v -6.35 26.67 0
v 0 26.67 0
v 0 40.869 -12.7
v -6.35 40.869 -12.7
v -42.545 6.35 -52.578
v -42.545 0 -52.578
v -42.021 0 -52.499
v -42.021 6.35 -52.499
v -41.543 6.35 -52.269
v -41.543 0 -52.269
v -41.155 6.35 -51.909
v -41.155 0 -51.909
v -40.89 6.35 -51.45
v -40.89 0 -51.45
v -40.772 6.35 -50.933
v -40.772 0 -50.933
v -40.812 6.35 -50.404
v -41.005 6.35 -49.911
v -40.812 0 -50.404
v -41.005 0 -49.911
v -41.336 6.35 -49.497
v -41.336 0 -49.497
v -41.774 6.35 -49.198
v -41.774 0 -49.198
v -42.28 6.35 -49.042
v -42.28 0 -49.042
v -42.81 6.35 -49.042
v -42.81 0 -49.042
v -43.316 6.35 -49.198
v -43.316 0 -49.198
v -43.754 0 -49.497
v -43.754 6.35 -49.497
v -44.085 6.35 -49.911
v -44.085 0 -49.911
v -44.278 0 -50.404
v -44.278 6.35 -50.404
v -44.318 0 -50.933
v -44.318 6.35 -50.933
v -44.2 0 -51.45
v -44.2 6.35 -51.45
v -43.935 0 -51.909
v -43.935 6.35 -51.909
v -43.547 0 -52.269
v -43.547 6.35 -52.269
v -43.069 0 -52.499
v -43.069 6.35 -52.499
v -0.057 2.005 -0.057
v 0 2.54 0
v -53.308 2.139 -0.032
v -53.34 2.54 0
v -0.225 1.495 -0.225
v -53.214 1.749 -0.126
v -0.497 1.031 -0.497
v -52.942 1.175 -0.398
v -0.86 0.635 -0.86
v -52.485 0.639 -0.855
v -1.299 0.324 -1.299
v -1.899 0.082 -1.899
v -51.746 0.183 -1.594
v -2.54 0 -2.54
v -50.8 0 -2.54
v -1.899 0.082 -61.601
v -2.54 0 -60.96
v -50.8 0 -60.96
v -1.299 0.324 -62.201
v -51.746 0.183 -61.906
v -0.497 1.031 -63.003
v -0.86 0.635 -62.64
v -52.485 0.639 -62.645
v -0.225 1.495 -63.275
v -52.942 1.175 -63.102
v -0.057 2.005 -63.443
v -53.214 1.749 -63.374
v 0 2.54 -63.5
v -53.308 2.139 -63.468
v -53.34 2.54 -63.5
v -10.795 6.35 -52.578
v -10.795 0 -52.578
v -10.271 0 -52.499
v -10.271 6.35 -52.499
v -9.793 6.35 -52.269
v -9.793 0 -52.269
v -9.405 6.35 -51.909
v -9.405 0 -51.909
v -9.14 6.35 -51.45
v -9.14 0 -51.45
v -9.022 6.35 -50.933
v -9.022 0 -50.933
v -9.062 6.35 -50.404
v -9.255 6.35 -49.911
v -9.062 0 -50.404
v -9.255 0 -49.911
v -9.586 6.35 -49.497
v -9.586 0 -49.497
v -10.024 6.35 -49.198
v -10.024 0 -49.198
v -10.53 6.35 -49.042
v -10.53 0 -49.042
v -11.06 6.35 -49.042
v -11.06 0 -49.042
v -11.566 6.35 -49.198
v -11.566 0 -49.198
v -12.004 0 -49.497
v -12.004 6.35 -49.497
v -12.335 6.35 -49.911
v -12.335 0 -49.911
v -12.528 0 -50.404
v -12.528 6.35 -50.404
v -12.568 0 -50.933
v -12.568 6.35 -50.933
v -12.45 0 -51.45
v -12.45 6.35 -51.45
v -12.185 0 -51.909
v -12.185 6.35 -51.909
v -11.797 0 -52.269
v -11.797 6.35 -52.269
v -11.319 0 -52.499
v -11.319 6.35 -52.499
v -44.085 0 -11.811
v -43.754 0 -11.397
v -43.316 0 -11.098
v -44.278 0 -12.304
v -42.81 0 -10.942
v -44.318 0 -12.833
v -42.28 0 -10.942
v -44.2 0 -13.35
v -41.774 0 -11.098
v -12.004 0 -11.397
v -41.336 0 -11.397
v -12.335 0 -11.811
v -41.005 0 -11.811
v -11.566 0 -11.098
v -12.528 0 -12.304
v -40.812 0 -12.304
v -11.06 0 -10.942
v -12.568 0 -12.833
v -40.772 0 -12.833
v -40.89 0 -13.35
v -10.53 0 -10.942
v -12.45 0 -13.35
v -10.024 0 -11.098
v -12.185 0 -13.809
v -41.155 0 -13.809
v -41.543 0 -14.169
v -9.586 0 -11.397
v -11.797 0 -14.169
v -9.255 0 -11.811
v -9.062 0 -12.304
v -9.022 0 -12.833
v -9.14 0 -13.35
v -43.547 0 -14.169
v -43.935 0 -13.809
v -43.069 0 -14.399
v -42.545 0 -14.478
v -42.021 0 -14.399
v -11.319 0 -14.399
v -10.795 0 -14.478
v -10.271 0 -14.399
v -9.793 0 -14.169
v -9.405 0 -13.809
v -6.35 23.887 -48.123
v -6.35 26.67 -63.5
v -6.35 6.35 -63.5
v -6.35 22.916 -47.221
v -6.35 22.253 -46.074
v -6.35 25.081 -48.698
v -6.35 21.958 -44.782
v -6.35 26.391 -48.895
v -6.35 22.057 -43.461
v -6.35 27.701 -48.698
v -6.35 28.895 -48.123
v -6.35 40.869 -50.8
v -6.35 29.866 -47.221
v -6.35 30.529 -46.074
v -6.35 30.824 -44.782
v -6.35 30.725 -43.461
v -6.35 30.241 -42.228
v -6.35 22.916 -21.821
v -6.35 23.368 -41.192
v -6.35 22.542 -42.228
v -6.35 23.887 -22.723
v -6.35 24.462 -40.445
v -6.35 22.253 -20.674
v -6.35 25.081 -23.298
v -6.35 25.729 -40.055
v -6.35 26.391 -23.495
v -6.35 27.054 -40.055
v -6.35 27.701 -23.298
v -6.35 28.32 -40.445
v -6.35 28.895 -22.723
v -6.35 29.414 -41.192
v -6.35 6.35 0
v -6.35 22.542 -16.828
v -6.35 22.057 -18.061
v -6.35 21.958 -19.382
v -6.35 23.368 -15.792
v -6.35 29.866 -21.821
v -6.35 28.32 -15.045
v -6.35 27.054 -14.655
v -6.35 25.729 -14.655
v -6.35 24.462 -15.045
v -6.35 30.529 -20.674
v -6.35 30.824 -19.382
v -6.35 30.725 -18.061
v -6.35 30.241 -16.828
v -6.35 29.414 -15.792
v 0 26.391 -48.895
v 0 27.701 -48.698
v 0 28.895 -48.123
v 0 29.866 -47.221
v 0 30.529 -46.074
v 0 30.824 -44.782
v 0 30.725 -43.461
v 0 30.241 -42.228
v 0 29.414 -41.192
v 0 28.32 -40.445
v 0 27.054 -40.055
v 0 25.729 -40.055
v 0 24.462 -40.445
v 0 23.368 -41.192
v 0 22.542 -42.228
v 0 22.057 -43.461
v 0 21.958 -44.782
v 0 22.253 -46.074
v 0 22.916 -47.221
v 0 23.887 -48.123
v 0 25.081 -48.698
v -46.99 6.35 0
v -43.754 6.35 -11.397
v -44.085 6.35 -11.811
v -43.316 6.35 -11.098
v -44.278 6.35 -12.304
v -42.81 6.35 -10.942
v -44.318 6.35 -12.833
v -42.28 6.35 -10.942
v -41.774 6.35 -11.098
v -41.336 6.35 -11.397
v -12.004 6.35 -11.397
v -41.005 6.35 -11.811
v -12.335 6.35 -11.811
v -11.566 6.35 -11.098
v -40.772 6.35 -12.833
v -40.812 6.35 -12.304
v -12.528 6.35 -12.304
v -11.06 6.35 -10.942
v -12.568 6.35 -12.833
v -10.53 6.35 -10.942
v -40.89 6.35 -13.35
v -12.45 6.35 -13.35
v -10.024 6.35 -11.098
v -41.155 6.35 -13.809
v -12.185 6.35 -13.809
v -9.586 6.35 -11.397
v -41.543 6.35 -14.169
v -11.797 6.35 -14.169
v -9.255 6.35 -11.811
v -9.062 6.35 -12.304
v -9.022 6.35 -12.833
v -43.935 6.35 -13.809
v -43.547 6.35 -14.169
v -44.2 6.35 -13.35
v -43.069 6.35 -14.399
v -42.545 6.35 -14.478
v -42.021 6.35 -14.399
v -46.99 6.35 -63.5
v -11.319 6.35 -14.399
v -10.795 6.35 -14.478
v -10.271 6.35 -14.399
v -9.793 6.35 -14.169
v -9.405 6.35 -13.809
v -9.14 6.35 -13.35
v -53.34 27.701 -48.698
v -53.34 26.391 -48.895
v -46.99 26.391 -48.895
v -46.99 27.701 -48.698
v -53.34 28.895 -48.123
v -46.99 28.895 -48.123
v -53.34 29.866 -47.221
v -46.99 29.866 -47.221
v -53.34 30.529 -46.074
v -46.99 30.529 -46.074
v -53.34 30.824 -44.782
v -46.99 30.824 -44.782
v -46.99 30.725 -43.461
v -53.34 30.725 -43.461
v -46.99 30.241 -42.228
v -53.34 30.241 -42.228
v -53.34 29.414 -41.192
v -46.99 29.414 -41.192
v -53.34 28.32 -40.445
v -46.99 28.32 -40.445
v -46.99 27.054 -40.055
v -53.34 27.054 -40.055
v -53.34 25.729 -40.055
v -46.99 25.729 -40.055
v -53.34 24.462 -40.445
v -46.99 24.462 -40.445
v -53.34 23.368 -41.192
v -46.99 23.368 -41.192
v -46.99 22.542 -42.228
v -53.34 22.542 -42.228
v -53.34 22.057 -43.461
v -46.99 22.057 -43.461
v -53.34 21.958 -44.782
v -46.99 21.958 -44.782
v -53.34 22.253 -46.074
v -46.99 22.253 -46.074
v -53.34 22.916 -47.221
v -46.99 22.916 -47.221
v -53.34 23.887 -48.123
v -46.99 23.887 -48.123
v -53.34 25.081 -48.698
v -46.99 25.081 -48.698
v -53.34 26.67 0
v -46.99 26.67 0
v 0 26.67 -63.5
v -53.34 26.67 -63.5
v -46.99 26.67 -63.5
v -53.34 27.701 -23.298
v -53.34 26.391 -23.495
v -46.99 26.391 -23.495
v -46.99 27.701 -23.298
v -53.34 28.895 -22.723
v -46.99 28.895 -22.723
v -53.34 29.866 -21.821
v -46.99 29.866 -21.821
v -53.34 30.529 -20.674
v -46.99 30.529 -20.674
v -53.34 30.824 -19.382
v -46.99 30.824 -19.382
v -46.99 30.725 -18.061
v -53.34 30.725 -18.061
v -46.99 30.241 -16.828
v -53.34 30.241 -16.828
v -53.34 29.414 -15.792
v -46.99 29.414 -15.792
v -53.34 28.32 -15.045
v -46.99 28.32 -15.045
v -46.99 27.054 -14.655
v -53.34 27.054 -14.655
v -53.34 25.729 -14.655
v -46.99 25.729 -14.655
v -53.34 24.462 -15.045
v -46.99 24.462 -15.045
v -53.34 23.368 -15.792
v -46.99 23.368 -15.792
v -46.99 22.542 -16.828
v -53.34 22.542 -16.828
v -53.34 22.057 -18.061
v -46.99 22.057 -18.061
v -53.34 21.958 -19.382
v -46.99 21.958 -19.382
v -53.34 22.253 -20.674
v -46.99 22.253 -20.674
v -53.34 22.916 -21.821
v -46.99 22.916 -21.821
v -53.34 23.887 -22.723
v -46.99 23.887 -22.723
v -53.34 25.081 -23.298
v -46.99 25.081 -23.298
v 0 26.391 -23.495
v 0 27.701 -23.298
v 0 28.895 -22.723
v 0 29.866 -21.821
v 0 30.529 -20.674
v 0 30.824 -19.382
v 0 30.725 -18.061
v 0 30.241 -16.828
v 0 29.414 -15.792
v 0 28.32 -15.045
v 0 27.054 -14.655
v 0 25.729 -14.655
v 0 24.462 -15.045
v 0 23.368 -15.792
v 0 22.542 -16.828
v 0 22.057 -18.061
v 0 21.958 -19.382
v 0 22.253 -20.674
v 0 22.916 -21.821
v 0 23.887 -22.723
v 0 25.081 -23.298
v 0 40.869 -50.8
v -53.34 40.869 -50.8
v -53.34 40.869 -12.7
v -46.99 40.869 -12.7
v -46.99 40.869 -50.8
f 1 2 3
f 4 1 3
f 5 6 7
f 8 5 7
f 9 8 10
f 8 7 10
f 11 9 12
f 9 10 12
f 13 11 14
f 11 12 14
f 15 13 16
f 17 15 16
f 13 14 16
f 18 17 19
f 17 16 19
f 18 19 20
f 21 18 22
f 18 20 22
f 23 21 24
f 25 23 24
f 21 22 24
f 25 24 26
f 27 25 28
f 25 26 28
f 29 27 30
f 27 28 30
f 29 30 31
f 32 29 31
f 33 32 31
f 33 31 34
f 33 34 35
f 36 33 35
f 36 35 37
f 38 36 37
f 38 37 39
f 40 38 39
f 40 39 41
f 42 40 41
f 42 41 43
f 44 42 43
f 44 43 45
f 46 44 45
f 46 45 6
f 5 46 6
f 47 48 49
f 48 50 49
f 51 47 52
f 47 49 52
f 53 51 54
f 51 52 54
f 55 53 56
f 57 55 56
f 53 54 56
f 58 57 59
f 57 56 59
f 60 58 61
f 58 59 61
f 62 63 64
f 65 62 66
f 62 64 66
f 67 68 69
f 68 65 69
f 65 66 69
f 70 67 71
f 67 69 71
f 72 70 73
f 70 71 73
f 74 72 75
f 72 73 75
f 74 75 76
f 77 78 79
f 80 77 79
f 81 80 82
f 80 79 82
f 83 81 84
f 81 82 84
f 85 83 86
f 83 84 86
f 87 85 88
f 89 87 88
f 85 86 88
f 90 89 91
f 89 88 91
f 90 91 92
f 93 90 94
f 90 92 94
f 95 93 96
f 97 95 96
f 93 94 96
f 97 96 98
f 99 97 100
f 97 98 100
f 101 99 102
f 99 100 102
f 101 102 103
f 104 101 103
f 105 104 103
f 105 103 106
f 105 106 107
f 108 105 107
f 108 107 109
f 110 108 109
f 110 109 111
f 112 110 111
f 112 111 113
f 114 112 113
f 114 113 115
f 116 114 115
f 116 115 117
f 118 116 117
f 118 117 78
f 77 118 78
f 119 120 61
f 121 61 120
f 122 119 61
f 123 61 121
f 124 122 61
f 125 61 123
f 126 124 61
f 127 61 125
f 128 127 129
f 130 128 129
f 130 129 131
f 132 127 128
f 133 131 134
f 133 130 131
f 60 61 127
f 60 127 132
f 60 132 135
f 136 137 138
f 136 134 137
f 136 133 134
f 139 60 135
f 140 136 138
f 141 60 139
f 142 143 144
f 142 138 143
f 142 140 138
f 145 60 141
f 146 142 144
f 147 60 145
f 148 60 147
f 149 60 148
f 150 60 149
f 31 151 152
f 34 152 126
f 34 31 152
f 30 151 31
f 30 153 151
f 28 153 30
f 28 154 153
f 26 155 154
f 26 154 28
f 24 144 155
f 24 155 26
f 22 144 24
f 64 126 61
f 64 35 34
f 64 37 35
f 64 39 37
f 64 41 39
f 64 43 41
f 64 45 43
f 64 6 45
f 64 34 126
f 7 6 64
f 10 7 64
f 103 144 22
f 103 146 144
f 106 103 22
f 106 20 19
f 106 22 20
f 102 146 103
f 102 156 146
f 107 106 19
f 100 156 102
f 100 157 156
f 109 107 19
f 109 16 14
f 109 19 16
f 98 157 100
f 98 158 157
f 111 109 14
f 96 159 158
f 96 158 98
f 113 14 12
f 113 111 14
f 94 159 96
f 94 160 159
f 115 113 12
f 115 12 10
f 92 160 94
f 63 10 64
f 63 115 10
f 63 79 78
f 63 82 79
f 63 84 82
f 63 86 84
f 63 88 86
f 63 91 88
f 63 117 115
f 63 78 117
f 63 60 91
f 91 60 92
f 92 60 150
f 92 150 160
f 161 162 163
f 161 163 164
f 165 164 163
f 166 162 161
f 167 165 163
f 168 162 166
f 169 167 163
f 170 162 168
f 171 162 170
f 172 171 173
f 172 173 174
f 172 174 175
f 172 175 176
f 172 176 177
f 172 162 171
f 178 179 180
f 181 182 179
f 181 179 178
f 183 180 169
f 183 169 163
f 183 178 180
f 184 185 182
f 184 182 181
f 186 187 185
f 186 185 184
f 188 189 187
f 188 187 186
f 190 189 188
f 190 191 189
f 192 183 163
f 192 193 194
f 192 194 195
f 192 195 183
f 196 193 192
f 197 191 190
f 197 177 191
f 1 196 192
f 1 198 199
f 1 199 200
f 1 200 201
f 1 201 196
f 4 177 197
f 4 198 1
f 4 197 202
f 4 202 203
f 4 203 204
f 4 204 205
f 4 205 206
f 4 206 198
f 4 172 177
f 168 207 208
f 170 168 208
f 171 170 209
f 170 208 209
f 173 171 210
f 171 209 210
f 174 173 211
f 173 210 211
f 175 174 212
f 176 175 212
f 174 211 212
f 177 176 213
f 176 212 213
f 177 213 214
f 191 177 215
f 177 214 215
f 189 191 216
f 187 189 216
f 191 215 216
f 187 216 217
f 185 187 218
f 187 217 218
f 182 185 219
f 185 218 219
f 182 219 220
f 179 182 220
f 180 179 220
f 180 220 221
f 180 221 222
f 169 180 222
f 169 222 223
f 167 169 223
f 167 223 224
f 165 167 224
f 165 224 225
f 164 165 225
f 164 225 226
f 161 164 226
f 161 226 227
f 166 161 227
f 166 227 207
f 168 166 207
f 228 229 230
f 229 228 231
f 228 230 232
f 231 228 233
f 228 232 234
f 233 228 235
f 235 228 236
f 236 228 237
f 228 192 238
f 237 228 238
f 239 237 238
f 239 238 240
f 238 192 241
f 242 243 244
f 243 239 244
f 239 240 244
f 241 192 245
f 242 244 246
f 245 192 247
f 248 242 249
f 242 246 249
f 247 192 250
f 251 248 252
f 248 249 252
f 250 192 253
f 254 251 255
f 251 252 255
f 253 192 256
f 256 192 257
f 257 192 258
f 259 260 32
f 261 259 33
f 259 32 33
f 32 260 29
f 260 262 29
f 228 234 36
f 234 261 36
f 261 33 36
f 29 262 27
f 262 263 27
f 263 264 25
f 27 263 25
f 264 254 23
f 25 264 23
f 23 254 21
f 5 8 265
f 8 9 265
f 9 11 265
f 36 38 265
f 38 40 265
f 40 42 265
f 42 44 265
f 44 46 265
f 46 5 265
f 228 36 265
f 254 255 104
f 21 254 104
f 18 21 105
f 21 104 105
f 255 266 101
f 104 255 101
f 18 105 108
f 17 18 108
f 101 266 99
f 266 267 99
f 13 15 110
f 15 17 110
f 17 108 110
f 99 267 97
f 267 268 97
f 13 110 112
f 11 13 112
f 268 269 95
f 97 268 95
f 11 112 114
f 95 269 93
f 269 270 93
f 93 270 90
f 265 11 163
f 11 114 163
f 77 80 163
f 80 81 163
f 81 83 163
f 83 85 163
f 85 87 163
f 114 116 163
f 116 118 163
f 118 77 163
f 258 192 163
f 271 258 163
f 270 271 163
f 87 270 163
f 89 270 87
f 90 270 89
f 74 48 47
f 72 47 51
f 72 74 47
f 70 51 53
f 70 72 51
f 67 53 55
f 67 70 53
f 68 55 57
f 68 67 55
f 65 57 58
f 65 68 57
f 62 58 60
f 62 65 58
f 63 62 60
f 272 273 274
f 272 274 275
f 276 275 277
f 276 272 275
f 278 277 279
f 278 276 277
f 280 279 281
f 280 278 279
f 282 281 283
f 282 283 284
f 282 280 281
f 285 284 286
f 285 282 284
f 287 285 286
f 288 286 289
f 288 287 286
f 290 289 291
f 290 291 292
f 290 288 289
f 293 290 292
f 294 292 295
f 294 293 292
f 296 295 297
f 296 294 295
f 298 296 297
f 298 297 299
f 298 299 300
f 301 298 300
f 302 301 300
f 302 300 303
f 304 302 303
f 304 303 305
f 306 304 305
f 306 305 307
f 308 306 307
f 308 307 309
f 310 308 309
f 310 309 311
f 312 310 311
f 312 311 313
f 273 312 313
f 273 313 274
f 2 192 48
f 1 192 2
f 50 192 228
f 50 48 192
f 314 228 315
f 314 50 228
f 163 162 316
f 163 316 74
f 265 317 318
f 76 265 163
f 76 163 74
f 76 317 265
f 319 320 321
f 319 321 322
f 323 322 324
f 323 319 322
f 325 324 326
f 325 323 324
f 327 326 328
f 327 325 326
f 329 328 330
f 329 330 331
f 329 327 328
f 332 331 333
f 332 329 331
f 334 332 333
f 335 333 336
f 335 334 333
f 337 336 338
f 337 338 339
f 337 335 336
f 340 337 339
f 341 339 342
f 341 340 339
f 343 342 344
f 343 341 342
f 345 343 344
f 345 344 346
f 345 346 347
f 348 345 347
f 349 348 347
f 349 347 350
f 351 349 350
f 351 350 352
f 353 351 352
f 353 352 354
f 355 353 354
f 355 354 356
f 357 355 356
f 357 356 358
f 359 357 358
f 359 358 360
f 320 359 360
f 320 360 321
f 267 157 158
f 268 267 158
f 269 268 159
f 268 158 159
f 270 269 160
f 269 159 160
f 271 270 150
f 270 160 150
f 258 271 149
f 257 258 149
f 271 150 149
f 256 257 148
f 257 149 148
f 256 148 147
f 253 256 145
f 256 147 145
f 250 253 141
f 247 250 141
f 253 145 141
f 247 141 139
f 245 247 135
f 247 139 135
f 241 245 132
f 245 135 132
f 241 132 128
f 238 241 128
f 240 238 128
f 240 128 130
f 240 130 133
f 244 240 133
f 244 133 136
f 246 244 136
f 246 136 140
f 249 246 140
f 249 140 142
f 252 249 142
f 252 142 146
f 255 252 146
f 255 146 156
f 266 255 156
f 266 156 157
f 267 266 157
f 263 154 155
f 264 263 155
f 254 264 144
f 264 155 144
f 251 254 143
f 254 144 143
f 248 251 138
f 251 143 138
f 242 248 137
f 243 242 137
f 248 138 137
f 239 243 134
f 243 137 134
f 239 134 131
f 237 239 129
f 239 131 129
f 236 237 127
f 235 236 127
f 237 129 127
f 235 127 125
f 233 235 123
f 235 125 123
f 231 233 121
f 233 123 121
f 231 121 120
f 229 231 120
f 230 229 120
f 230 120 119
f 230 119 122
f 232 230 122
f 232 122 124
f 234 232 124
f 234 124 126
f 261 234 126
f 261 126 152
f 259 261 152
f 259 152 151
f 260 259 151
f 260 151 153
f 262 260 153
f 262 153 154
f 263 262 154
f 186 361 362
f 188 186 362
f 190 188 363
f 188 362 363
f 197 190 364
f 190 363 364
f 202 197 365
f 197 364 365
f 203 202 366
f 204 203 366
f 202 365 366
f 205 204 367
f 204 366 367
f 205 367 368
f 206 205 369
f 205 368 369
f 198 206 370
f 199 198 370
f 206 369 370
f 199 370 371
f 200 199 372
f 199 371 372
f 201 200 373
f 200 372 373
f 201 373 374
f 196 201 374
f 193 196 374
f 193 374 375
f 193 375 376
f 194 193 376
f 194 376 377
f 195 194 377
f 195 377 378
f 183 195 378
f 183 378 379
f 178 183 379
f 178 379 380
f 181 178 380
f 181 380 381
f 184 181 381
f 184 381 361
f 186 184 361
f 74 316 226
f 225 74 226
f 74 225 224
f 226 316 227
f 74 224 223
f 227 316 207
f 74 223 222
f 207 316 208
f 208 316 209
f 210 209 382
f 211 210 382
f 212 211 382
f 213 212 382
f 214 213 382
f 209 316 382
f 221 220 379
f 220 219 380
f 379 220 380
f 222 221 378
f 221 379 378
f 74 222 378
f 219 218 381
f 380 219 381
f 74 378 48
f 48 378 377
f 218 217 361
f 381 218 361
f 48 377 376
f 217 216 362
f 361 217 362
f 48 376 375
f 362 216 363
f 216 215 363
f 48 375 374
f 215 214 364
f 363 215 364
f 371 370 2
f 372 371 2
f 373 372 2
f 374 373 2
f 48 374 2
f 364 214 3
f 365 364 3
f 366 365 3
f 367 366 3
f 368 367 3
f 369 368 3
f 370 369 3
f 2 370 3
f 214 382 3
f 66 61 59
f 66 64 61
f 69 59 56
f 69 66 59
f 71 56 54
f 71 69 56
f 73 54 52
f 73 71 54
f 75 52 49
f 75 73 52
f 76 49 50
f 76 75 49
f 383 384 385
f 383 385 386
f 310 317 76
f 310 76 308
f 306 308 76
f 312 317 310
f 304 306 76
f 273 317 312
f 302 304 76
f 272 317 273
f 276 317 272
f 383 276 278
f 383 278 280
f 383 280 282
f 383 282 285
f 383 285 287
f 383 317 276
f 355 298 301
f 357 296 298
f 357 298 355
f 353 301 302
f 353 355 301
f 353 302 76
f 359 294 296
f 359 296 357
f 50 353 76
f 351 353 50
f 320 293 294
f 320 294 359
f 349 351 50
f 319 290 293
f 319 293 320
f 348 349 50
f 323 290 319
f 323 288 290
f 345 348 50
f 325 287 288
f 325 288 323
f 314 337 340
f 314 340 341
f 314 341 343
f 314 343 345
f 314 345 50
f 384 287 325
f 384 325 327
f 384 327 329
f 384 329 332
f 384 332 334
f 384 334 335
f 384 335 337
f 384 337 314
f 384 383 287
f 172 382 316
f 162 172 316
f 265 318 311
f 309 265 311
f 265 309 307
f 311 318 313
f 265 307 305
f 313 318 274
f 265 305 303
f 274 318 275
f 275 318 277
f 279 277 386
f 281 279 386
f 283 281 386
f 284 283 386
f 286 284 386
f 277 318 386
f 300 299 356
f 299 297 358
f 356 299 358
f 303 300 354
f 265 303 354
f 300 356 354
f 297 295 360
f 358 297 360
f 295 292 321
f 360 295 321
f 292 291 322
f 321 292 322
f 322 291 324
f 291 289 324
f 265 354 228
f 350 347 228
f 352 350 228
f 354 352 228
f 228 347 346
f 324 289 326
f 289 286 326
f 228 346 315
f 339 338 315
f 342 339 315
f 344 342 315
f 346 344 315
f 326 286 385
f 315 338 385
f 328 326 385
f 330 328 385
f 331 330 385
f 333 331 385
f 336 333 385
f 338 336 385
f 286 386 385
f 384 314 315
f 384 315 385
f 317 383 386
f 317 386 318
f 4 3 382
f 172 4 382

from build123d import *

# Parameters (mm, degrees)
SKETCH1_W           = 63.5
SKETCH1_H           = 6.35
BOSS_EXTRUDE1_DEPTH = 53.34
BOSS_EXTRUDE2_DEPTH = 6.35
CUT_EXTRUDE1_REACH  = 94.454
SKETCH11_R          = 4.445
FILLET1_R           = 2.54
CUT_EXTRUDE2_REACH  = 94.454
SKETCH19_R          = 1.778


with BuildPart() as part:
    # Sketch1 → Boss-Extrude1 (new body)
    with BuildSketch(Plane(origin=(0, 0, 0), x_dir=(0, 0, -1), z_dir=(1, 0, 0))):
        with Locations((31.75, 3.175)):
            Rectangle(SKETCH1_W, SKETCH1_H)
    extrude(amount=-BOSS_EXTRUDE1_DEPTH)

    # Sketch2 → Boss-Extrude2 (add)
    with BuildSketch(Plane(origin=(0, 0, 0), x_dir=(0, 0, -1), z_dir=(1, 0, 0))):
        Polygon((0, 6.35), (0, 26.67), (12.7, 40.869031657), (50.8, 40.869031657), (63.5, 26.67), (63.5, 6.35), align=None)
    boss_extrude2 = extrude(amount=-BOSS_EXTRUDE2_DEPTH)

    # Sketch11 → Cut-Extrude1 (cut, up to next)
    with BuildSketch(Plane(origin=(0, 0, 0), x_dir=(0, 0, -1), z_dir=(1, 0, 0)), mode=Mode.PRIVATE) as cut_extrude1_sk1:
        with Locations((19.05, 26.391031657)):
            Circle(SKETCH11_R)
    cut_extrude1_tool1 = extrude(cut_extrude1_sk1.sketch, amount=-CUT_EXTRUDE1_REACH, mode=Mode.PRIVATE) & part.part
    # Sketch11 → Cut-Extrude1 (cut, up to next)
    with BuildSketch(Plane(origin=(0, 0, 0), x_dir=(0, 0, -1), z_dir=(1, 0, 0)), mode=Mode.PRIVATE) as cut_extrude1_sk2:
        with Locations((44.45, 26.391031657)):
            Circle(SKETCH11_R)
    cut_extrude1_tool2 = extrude(cut_extrude1_sk2.sketch, amount=-CUT_EXTRUDE1_REACH, mode=Mode.PRIVATE) & part.part
    cut_extrude1_1 = cut_extrude1_tool1.solids().sort_by_distance((0, 26.391032, -19.05))[0]
    add(cut_extrude1_1, mode=Mode.SUBTRACT)
    cut_extrude1_2 = cut_extrude1_tool2.solids().sort_by_distance((0, 26.391032, -44.45))[0]
    add(cut_extrude1_2, mode=Mode.SUBTRACT)
    cut_extrude1 = cut_extrude1_1 + cut_extrude1_2  # Cut-Extrude1 as one shape, for the pattern or mirror that repeats it

    # Fillet1
    fillet1_edges = [part.edges().sort_by_distance(p)[0] for p in [
        (0, 0, -31.75),
        (-53.34, 0, -31.75),
        (-26.67, 0, -63.5),
        (-26.67, 0, 0),
    ]]
    fillet(fillet1_edges, radius=FILLET1_R)

    # Sketch19 → Cut-Extrude2 (cut, up to next)
    with BuildSketch(Plane.XZ, mode=Mode.PRIVATE) as cut_extrude2_sk1:
        with Locations(Location((-10.795, -50.8, 0), (0, 0, 270))):
            Circle(SKETCH19_R)
    cut_extrude2_tool1 = extrude(cut_extrude2_sk1.sketch, amount=-CUT_EXTRUDE2_REACH, mode=Mode.PRIVATE) & part.part
    # Sketch19 → Cut-Extrude2 (cut, up to next)
    with BuildSketch(Plane.XZ, mode=Mode.PRIVATE) as cut_extrude2_sk2:
        with Locations(Location((-42.545, -50.8, 0), (0, 0, 270))):
            Circle(SKETCH19_R)
    cut_extrude2_tool2 = extrude(cut_extrude2_sk2.sketch, amount=-CUT_EXTRUDE2_REACH, mode=Mode.PRIVATE) & part.part
    # Sketch19 → Cut-Extrude2 (cut, up to next)
    with BuildSketch(Plane.XZ, mode=Mode.PRIVATE) as cut_extrude2_sk3:
        with Locations(Location((-42.545, -12.7, 0), (0, 0, 270))):
            Circle(SKETCH19_R)
    cut_extrude2_tool3 = extrude(cut_extrude2_sk3.sketch, amount=-CUT_EXTRUDE2_REACH, mode=Mode.PRIVATE) & part.part
    # Sketch19 → Cut-Extrude2 (cut, up to next)
    with BuildSketch(Plane.XZ, mode=Mode.PRIVATE) as cut_extrude2_sk4:
        with Locations(Location((-10.795, -12.7, 0), (0, 0, 270))):
            Circle(SKETCH19_R)
    cut_extrude2_tool4 = extrude(cut_extrude2_sk4.sketch, amount=-CUT_EXTRUDE2_REACH, mode=Mode.PRIVATE) & part.part
    add(cut_extrude2_tool1.solids().sort_by_distance((-10.795, 0, -50.8))[0], mode=Mode.SUBTRACT)
    add(cut_extrude2_tool2.solids().sort_by_distance((-42.545, 0, -50.8))[0], mode=Mode.SUBTRACT)
    add(cut_extrude2_tool3.solids().sort_by_distance((-42.545, 0, -12.7))[0], mode=Mode.SUBTRACT)
    add(cut_extrude2_tool4.solids().sort_by_distance((-10.795, 0, -12.7))[0], mode=Mode.SUBTRACT)

    # Mirror1: Boss-Extrude2, Cut-Extrude1 across plane
    add(boss_extrude2.mirror(Plane(origin=(-26.67, 0, 0), x_dir=(0, 0, 1), z_dir=(1, 0, 0))))
    add(cut_extrude1.mirror(Plane(origin=(-26.67, 0, 0), x_dir=(0, 0, 1), z_dir=(1, 0, 0))), mode=Mode.SUBTRACT)


solid = part.part
